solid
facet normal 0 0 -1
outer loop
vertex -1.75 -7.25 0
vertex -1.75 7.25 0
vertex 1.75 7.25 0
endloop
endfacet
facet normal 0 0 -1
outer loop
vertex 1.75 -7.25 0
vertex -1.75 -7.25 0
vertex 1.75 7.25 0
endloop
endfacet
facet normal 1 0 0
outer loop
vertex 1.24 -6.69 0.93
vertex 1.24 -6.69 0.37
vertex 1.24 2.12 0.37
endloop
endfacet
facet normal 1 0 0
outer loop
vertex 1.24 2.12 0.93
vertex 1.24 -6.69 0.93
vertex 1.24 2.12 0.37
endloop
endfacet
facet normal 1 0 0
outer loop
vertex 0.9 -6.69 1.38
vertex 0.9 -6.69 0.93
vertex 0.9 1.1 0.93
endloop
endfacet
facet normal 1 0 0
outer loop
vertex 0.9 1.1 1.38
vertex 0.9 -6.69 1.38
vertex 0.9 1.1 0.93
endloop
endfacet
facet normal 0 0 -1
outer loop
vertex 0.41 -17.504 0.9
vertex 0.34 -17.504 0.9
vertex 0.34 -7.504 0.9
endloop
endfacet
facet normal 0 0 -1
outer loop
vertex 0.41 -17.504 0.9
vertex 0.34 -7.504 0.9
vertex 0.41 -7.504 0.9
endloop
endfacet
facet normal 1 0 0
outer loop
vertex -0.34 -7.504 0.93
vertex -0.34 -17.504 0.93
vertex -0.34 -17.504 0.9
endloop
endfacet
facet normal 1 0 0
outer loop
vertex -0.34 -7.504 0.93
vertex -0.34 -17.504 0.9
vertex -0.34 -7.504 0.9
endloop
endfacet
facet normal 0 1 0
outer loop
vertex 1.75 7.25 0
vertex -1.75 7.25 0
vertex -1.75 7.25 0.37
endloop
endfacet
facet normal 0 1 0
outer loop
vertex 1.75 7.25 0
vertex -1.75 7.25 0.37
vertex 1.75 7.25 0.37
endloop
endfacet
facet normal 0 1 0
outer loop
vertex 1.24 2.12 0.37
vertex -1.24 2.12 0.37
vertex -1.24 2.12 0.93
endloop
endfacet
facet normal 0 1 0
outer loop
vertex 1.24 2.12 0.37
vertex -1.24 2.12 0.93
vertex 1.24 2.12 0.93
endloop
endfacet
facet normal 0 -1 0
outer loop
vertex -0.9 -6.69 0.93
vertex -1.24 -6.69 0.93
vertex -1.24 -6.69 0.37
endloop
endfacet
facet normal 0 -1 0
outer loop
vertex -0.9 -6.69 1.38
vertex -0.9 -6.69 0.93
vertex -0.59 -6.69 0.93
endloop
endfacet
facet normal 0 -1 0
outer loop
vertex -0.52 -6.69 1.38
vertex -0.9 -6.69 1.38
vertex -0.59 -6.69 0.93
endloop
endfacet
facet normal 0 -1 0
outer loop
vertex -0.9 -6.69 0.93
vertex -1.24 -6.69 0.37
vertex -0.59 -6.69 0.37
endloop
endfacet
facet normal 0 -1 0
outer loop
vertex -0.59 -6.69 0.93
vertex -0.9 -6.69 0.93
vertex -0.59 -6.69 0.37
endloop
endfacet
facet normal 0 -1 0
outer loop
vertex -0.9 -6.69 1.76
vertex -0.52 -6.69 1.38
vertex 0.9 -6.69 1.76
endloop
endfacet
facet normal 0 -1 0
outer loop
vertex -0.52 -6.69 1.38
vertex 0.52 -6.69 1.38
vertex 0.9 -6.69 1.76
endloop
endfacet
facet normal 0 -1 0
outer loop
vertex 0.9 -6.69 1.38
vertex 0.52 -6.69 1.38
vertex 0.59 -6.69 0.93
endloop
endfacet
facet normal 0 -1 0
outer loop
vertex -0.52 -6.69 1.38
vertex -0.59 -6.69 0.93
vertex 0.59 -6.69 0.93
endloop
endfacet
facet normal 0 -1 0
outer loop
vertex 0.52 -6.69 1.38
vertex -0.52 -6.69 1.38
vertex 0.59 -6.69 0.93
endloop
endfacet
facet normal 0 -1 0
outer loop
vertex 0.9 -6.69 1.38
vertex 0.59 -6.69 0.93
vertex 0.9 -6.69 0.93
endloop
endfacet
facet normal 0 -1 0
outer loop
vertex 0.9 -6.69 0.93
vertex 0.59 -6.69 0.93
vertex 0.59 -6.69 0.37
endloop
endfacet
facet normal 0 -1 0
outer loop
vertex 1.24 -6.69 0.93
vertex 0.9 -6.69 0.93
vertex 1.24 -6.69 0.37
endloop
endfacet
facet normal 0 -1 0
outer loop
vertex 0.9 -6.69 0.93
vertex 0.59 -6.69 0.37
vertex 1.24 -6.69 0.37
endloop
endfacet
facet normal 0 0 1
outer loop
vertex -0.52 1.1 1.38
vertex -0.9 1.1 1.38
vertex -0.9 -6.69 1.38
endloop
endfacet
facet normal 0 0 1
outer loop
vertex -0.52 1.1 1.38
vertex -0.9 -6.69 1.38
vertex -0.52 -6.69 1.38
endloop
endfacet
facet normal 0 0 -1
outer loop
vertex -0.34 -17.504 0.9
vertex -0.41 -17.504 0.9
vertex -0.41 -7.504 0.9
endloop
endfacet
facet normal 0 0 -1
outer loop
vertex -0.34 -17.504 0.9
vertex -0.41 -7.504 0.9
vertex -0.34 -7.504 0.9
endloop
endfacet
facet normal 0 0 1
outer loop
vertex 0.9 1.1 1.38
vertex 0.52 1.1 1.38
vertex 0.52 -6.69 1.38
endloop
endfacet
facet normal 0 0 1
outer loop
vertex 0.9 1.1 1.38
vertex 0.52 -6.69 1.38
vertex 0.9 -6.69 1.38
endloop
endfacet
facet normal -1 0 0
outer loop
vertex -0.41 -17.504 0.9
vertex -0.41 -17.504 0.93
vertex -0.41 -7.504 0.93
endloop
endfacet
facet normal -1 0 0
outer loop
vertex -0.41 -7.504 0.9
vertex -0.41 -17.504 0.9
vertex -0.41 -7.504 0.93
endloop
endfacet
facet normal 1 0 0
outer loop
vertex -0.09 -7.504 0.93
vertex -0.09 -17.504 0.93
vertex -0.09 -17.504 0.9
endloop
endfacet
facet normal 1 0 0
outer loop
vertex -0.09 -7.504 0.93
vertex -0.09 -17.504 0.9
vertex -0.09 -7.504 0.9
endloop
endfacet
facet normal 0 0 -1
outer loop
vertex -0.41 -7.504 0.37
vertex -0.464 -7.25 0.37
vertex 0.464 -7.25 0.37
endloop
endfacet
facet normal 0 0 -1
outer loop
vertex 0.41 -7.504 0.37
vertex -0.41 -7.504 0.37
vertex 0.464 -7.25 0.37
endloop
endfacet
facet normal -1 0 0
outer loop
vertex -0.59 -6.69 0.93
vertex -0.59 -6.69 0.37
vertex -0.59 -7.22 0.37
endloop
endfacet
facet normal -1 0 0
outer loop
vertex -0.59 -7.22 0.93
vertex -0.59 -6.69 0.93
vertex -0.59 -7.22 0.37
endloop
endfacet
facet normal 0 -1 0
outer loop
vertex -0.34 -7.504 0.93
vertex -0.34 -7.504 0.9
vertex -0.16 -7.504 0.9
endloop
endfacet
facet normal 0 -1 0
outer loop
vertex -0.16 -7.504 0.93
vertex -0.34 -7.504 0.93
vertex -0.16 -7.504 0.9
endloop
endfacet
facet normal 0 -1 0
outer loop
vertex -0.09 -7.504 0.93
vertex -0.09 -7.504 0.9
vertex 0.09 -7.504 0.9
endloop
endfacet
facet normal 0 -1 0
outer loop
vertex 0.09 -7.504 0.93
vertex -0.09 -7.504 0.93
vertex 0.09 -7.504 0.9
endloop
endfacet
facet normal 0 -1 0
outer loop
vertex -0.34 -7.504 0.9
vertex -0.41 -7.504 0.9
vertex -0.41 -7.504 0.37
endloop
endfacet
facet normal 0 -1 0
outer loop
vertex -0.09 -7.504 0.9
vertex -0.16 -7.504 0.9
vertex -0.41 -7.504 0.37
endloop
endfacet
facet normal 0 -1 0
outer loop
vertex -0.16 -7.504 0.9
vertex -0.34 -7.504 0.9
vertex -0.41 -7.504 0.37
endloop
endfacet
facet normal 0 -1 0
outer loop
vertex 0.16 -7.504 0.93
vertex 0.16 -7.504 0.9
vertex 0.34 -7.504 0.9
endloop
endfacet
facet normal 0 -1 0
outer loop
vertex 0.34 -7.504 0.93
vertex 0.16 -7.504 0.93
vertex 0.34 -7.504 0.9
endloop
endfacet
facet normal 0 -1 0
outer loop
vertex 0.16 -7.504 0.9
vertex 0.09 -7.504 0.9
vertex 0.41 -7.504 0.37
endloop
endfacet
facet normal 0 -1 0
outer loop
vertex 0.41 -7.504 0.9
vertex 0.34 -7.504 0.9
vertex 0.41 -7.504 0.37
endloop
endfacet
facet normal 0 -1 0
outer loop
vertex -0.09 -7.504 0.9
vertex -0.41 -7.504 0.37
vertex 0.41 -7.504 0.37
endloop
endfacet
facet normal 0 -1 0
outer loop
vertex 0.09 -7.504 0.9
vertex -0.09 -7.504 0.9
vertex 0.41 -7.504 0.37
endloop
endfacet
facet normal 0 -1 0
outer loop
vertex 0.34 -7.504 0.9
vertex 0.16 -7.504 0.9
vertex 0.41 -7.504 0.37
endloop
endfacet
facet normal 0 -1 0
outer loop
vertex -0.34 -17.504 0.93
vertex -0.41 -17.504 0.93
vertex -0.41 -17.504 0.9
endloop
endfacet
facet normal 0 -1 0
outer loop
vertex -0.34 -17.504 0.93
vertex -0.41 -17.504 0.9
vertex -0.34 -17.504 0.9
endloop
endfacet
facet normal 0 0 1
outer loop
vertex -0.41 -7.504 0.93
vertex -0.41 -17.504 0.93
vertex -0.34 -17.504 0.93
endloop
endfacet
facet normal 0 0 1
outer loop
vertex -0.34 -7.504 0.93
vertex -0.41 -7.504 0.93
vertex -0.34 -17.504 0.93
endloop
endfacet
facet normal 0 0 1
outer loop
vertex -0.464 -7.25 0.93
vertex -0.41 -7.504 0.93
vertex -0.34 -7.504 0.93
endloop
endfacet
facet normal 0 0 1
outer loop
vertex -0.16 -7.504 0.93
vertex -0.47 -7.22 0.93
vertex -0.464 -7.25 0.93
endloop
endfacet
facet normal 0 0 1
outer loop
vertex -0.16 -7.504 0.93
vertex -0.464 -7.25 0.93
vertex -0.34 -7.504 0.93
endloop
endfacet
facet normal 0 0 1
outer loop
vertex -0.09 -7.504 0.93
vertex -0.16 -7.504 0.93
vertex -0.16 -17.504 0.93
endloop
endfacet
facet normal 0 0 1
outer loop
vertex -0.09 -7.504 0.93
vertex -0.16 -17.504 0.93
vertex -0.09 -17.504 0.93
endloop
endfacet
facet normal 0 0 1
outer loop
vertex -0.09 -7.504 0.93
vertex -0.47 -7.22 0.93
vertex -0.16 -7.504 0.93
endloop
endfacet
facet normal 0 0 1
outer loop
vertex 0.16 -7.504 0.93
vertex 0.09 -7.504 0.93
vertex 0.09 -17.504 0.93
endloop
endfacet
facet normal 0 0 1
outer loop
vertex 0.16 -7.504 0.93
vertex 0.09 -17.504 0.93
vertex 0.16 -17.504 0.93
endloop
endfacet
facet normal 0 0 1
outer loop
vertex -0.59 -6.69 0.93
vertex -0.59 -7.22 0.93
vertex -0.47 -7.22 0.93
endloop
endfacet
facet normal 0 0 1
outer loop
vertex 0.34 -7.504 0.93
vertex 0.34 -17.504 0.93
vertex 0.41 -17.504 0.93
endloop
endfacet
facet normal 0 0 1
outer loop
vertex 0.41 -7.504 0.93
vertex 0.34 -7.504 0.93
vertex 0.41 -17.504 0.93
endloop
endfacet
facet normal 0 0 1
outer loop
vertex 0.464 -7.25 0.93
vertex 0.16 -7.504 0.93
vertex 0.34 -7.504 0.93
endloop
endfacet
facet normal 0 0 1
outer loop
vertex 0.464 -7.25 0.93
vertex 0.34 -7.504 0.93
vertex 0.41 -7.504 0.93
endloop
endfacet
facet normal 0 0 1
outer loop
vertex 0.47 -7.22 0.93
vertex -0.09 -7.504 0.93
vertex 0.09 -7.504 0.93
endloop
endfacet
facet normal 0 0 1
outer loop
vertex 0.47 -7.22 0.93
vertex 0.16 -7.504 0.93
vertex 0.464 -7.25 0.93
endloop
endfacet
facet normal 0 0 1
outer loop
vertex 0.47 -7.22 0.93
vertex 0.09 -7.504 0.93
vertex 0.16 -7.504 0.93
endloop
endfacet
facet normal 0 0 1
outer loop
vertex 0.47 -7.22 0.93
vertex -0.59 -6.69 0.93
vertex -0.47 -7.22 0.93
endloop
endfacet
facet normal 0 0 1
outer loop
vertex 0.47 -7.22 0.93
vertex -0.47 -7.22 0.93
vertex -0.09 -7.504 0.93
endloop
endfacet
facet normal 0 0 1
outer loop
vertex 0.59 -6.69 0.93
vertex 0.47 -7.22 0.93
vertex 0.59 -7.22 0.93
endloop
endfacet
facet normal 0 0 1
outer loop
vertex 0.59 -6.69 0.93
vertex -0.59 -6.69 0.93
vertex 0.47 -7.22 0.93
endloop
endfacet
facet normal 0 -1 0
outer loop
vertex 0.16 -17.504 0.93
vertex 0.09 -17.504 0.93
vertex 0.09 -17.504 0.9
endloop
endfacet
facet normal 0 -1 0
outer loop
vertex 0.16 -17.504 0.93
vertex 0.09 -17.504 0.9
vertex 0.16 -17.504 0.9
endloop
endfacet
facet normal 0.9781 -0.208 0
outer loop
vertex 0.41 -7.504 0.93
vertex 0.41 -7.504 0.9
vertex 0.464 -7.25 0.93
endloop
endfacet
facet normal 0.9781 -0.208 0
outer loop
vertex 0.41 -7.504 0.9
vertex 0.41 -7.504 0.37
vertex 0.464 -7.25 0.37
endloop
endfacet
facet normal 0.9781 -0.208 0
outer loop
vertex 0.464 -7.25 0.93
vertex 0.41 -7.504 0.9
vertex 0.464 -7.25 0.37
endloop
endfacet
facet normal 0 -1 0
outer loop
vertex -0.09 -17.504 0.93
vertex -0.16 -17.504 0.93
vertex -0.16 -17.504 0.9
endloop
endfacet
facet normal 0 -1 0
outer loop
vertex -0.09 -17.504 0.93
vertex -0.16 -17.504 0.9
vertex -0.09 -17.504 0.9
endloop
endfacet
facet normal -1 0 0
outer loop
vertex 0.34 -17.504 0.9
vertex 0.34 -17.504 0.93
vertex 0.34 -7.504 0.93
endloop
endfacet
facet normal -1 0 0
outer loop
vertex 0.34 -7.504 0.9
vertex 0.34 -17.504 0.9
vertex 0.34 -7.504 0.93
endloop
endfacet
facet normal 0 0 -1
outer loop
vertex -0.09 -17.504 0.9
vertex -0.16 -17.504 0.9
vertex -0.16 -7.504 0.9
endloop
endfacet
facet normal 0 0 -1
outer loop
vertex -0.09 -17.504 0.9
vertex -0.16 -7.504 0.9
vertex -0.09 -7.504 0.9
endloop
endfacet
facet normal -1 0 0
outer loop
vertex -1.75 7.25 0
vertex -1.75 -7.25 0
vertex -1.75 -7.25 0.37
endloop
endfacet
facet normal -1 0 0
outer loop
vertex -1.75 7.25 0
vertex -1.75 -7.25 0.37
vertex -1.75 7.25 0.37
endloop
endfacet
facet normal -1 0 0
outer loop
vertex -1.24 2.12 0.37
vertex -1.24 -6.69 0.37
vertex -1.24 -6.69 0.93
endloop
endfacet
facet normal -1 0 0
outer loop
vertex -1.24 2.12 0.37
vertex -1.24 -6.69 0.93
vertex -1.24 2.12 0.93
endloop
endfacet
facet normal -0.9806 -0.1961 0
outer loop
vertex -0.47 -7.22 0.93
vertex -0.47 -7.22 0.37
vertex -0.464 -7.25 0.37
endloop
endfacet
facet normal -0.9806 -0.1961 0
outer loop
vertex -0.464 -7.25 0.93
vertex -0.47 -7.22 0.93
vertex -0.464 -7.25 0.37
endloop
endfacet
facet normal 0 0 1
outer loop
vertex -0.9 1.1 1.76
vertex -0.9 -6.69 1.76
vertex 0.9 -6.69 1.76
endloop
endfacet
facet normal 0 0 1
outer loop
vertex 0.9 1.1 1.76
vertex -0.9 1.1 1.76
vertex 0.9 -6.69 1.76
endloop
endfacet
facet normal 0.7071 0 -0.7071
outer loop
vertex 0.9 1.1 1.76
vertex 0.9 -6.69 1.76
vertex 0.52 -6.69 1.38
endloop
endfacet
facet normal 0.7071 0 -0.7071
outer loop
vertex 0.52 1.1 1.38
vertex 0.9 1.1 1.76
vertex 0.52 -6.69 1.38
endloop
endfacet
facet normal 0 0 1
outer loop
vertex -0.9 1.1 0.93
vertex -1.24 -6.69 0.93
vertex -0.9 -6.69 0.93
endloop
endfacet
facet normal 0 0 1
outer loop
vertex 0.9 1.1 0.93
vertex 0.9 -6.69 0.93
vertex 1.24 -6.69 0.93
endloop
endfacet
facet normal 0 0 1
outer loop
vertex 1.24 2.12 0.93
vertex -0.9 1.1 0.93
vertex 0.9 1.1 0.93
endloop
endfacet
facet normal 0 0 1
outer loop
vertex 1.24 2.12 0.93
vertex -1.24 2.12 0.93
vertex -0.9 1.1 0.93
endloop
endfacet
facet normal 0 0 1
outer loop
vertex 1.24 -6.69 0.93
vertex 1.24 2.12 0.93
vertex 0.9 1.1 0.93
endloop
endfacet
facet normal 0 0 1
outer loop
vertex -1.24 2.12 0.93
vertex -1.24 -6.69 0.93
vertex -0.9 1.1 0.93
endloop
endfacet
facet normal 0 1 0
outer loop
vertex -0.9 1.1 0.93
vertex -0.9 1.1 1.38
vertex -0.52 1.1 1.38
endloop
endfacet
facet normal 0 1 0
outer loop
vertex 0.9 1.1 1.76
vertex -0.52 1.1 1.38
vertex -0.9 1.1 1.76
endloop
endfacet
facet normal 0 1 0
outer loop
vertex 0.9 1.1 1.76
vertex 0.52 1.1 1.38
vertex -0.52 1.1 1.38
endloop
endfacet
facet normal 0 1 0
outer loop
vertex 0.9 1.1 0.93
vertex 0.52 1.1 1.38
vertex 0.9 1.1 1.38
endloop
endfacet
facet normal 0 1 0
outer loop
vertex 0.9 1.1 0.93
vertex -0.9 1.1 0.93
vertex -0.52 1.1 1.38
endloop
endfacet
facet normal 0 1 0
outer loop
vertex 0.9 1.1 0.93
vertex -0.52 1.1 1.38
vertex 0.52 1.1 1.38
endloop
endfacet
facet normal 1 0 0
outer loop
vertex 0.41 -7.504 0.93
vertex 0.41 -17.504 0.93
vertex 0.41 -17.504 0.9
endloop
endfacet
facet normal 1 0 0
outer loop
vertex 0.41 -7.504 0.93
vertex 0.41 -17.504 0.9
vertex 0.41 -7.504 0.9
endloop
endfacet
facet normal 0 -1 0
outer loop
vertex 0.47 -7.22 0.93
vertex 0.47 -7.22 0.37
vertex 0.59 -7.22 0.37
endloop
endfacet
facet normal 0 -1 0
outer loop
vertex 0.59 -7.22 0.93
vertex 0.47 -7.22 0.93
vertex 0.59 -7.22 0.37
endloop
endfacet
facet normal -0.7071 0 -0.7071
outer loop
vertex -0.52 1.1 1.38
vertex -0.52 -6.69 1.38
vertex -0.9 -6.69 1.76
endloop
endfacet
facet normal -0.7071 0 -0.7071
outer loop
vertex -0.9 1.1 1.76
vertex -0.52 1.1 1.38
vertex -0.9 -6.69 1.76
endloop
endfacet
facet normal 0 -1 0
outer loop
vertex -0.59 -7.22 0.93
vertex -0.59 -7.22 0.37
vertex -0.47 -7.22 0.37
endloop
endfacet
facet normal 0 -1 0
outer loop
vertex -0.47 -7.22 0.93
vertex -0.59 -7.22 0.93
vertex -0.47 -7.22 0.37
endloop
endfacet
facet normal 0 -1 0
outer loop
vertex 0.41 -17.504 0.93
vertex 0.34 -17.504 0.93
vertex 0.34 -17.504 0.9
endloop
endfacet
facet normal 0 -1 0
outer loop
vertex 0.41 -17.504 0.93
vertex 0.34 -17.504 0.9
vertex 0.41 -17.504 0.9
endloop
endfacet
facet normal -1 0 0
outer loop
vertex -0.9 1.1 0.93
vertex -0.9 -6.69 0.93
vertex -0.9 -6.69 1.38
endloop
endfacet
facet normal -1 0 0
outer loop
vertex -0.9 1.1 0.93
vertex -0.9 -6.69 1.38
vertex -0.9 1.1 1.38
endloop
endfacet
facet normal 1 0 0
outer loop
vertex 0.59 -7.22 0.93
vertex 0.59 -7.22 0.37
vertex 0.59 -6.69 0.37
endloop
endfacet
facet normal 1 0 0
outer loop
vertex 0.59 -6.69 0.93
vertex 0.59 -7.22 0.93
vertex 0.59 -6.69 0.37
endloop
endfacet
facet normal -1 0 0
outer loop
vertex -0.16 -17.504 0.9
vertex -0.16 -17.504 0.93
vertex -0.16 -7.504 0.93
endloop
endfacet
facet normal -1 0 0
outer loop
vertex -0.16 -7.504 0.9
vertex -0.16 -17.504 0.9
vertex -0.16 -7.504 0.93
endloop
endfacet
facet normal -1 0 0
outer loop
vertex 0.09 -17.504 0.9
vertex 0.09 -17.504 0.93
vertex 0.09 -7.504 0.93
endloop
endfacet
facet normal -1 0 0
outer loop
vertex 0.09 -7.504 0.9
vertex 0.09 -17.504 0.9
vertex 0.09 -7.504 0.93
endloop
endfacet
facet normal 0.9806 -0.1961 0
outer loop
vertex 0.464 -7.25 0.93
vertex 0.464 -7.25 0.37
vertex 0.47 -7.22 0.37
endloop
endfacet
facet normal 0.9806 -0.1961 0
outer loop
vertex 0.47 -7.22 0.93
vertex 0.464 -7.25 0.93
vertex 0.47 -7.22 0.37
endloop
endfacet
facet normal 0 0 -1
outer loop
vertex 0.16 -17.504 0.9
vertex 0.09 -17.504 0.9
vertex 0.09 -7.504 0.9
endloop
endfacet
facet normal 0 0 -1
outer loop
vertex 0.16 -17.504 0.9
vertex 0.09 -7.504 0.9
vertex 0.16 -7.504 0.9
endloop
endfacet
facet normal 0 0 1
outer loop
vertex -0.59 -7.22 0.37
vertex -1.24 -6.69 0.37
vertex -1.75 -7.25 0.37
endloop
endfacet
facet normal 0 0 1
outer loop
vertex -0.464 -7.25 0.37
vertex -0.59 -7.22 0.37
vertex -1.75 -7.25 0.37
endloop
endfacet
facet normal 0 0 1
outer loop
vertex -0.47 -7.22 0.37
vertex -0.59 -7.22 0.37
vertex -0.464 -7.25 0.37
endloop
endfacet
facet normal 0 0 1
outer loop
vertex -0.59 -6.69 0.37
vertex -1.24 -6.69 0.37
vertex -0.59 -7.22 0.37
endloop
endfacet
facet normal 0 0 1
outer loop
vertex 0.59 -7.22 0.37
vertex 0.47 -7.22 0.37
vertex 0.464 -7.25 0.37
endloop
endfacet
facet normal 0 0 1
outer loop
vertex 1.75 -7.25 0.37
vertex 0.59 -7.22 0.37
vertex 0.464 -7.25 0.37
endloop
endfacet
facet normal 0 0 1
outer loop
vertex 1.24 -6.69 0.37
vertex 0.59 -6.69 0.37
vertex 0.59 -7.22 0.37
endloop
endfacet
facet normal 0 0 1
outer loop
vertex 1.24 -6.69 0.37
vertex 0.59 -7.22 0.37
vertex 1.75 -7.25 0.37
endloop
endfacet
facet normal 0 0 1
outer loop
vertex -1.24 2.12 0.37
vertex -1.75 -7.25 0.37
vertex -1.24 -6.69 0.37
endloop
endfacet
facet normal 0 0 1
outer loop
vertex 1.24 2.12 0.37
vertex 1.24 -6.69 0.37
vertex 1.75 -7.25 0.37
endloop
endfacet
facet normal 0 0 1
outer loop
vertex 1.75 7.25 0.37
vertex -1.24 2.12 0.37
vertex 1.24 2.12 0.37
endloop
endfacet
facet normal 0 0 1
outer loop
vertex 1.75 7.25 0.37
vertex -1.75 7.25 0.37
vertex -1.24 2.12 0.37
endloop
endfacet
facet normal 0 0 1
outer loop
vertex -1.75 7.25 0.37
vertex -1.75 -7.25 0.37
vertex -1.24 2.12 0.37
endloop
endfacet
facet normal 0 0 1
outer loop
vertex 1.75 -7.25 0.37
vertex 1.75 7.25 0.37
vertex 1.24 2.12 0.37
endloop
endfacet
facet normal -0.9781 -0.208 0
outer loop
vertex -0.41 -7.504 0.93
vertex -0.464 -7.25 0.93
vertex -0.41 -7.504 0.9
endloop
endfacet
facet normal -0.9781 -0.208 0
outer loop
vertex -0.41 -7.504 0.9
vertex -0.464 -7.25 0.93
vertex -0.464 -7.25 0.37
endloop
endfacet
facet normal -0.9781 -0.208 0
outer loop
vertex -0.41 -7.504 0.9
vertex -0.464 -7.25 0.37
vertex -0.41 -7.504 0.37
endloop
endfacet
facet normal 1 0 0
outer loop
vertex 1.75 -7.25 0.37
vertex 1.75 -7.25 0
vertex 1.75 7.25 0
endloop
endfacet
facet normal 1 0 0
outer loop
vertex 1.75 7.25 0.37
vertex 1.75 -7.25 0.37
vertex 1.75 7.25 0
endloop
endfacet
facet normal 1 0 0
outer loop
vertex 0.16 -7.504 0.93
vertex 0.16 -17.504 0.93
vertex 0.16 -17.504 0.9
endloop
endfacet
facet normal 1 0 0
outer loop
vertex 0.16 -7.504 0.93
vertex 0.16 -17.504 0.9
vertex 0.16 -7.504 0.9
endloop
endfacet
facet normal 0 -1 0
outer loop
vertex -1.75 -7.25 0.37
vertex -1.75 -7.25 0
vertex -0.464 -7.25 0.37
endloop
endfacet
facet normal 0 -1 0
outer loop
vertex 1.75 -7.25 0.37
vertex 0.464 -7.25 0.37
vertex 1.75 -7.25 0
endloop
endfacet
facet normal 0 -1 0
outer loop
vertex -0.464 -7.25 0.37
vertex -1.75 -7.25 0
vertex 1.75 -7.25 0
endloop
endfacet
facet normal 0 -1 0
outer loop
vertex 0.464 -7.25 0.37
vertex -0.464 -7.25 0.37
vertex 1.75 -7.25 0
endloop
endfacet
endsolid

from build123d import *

# Parameters (mm, degrees)
SKETCH1_W           = 3.5
SKETCH1_H           = 14.5
BOSS_EXTRUDE1_DEPTH = 0.37
SKETCH2_W           = 2.48
SKETCH2_H           = 8.81
BOSS_EXTRUDE2_DEPTH = 0.56
SKETCH3_W           = 0.07
SKETCH3_H           = 10
BOSS_EXTRUDE3_DEPTH = 0.03
SKETCH5_W           = 1.8
SKETCH5_H           = 7.79
BOSS_EXTRUDE4_DEPTH = 0.45
BOSS_EXTRUDE5_DEPTH = 7.79


with BuildPart() as part:
    # Sketch1 → Boss-Extrude1 (new body)
    with BuildSketch(Plane.XY):
        Rectangle(SKETCH1_W, SKETCH1_H)
    extrude(amount=BOSS_EXTRUDE1_DEPTH)

    # Sketch2 → Boss-Extrude2 (add)
    with BuildSketch(Plane.XY.offset(0.37)):
        with Locations((0, -2.285)):
            Rectangle(SKETCH2_W, SKETCH2_H)
        Polygon((0.59, -6.69), (-0.59, -6.69), (-0.59, -7.22), (-0.47, -7.22), (0.47, -7.22), (0.59, -7.22), align=None)
        Polygon((0.463655834, -7.25), (-0.463655834, -7.25), (-0.41, -7.503725219), (0.41, -7.503725219), align=None)
        Polygon((0.47, -7.22), (-0.47, -7.22), (-0.463655834, -7.25), (0.463655834, -7.25), align=None)
    extrude(amount=BOSS_EXTRUDE2_DEPTH)

    # Sketch3 → Boss-Extrude3 (add)
    with BuildSketch(Plane.XY.offset(0.93)):
        with Locations((-0.375, -12.503725219)):
            Rectangle(SKETCH3_W, SKETCH3_H)
        with Locations((-0.125, -12.503725219)):
            Rectangle(SKETCH3_W, SKETCH3_H)
        with Locations((0.125, -12.503725219)):
            Rectangle(SKETCH3_W, SKETCH3_H)
        with Locations((0.375, -12.503725219)):
            Rectangle(SKETCH3_W, SKETCH3_H)
    extrude(amount=-BOSS_EXTRUDE3_DEPTH)

    # Sketch5 → Boss-Extrude4 (add)
    with BuildSketch(Plane.XY.offset(0.93)):
        with Locations((0, -2.795)):
            Rectangle(SKETCH5_W, SKETCH5_H)
    extrude(amount=BOSS_EXTRUDE4_DEPTH)

    # Sketch6 → Boss-Extrude5 (add)
    with BuildSketch(Plane.XZ.offset(6.69)):
        Polygon((-0.52, 1.38), (-0.9, 1.76), (0.9, 1.76), (0.52, 1.38), align=None)
    extrude(amount=-BOSS_EXTRUDE5_DEPTH)


solid = part.part
